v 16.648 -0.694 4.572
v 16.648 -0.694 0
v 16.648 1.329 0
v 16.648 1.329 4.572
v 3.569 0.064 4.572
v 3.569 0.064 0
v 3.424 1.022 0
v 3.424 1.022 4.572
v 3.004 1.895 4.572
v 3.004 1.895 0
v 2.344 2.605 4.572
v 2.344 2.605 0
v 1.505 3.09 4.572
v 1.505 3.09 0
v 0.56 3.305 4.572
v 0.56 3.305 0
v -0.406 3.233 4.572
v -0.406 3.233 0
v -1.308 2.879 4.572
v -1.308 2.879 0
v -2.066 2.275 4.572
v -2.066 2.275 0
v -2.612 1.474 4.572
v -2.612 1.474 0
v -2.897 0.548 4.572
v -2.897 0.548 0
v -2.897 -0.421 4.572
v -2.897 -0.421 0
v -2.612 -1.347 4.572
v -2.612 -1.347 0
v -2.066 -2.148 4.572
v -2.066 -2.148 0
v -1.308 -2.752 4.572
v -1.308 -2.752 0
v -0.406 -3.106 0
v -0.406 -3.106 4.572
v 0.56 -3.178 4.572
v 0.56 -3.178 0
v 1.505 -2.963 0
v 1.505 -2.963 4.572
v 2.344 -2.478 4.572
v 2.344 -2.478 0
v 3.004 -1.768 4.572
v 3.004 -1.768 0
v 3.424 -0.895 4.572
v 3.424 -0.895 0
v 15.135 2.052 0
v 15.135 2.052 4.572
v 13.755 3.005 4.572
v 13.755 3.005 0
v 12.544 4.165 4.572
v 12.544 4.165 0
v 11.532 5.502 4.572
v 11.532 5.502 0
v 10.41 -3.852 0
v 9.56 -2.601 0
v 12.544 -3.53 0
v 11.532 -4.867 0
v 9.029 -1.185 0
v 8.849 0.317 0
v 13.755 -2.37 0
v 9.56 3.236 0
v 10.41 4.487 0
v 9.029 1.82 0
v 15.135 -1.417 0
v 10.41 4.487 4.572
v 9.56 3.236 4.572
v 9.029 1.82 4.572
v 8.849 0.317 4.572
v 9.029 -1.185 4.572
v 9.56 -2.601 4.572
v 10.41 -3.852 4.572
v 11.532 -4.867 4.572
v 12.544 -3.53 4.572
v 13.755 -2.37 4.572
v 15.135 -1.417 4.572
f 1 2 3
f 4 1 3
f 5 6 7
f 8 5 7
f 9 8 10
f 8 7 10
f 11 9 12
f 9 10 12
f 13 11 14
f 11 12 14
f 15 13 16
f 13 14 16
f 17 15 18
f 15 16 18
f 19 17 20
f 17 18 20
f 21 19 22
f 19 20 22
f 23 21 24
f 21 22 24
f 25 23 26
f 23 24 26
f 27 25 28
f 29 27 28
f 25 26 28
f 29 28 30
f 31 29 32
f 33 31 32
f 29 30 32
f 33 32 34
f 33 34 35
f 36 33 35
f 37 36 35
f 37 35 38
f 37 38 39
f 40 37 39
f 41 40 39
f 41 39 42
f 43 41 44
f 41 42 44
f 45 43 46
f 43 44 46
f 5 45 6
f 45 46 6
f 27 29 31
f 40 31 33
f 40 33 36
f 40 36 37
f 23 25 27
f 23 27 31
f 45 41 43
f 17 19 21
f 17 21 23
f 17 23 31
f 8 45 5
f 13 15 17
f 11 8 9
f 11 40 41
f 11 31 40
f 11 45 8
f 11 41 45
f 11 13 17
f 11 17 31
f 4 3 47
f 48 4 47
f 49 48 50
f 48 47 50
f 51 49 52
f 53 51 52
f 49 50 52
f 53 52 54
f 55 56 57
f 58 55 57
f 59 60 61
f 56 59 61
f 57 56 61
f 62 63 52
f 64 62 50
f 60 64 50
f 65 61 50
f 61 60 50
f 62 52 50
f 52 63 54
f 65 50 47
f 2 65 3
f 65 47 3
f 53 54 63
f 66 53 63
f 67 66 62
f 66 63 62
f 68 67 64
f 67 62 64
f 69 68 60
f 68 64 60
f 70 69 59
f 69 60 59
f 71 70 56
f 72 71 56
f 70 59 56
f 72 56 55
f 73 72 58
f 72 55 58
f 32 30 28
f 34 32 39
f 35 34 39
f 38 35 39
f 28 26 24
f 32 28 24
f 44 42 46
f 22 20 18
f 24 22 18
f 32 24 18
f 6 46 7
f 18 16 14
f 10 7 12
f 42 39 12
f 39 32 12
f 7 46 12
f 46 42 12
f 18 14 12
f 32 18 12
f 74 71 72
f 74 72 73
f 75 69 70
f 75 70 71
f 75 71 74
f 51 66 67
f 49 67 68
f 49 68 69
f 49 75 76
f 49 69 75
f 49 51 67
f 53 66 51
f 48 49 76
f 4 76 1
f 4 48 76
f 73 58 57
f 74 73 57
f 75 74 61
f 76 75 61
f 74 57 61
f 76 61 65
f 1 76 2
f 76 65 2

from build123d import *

# Parameters (mm, degrees)
F0_R     = 3.251044
F1_DEPTH = 4.572


with BuildPart() as f1:
    # F0 (on Top) → F1 (new body)
    with BuildSketch(Plane.XY):
        with Locations((0.3175, 0.0635)):
            Circle(F0_R)
        with BuildLine():
            ThreePointArc((16.648034, 1.329108), (13.755349, 3.005007), (11.532436, 5.50199))
            ThreePointArc((11.532436, 5.50199), (8.849202, 0.3175), (11.532436, -4.86699))
            ThreePointArc((11.532436, -4.86699), (13.755349, -2.370007), (16.648034, -0.694108))
            Line((16.648034, -0.694108), (16.648034, 0.3175))
            Line((16.648034, 0.3175), (16.648034, 1.329108))
        make_face()
    extrude(amount=F1_DEPTH)


solid = f1.part
